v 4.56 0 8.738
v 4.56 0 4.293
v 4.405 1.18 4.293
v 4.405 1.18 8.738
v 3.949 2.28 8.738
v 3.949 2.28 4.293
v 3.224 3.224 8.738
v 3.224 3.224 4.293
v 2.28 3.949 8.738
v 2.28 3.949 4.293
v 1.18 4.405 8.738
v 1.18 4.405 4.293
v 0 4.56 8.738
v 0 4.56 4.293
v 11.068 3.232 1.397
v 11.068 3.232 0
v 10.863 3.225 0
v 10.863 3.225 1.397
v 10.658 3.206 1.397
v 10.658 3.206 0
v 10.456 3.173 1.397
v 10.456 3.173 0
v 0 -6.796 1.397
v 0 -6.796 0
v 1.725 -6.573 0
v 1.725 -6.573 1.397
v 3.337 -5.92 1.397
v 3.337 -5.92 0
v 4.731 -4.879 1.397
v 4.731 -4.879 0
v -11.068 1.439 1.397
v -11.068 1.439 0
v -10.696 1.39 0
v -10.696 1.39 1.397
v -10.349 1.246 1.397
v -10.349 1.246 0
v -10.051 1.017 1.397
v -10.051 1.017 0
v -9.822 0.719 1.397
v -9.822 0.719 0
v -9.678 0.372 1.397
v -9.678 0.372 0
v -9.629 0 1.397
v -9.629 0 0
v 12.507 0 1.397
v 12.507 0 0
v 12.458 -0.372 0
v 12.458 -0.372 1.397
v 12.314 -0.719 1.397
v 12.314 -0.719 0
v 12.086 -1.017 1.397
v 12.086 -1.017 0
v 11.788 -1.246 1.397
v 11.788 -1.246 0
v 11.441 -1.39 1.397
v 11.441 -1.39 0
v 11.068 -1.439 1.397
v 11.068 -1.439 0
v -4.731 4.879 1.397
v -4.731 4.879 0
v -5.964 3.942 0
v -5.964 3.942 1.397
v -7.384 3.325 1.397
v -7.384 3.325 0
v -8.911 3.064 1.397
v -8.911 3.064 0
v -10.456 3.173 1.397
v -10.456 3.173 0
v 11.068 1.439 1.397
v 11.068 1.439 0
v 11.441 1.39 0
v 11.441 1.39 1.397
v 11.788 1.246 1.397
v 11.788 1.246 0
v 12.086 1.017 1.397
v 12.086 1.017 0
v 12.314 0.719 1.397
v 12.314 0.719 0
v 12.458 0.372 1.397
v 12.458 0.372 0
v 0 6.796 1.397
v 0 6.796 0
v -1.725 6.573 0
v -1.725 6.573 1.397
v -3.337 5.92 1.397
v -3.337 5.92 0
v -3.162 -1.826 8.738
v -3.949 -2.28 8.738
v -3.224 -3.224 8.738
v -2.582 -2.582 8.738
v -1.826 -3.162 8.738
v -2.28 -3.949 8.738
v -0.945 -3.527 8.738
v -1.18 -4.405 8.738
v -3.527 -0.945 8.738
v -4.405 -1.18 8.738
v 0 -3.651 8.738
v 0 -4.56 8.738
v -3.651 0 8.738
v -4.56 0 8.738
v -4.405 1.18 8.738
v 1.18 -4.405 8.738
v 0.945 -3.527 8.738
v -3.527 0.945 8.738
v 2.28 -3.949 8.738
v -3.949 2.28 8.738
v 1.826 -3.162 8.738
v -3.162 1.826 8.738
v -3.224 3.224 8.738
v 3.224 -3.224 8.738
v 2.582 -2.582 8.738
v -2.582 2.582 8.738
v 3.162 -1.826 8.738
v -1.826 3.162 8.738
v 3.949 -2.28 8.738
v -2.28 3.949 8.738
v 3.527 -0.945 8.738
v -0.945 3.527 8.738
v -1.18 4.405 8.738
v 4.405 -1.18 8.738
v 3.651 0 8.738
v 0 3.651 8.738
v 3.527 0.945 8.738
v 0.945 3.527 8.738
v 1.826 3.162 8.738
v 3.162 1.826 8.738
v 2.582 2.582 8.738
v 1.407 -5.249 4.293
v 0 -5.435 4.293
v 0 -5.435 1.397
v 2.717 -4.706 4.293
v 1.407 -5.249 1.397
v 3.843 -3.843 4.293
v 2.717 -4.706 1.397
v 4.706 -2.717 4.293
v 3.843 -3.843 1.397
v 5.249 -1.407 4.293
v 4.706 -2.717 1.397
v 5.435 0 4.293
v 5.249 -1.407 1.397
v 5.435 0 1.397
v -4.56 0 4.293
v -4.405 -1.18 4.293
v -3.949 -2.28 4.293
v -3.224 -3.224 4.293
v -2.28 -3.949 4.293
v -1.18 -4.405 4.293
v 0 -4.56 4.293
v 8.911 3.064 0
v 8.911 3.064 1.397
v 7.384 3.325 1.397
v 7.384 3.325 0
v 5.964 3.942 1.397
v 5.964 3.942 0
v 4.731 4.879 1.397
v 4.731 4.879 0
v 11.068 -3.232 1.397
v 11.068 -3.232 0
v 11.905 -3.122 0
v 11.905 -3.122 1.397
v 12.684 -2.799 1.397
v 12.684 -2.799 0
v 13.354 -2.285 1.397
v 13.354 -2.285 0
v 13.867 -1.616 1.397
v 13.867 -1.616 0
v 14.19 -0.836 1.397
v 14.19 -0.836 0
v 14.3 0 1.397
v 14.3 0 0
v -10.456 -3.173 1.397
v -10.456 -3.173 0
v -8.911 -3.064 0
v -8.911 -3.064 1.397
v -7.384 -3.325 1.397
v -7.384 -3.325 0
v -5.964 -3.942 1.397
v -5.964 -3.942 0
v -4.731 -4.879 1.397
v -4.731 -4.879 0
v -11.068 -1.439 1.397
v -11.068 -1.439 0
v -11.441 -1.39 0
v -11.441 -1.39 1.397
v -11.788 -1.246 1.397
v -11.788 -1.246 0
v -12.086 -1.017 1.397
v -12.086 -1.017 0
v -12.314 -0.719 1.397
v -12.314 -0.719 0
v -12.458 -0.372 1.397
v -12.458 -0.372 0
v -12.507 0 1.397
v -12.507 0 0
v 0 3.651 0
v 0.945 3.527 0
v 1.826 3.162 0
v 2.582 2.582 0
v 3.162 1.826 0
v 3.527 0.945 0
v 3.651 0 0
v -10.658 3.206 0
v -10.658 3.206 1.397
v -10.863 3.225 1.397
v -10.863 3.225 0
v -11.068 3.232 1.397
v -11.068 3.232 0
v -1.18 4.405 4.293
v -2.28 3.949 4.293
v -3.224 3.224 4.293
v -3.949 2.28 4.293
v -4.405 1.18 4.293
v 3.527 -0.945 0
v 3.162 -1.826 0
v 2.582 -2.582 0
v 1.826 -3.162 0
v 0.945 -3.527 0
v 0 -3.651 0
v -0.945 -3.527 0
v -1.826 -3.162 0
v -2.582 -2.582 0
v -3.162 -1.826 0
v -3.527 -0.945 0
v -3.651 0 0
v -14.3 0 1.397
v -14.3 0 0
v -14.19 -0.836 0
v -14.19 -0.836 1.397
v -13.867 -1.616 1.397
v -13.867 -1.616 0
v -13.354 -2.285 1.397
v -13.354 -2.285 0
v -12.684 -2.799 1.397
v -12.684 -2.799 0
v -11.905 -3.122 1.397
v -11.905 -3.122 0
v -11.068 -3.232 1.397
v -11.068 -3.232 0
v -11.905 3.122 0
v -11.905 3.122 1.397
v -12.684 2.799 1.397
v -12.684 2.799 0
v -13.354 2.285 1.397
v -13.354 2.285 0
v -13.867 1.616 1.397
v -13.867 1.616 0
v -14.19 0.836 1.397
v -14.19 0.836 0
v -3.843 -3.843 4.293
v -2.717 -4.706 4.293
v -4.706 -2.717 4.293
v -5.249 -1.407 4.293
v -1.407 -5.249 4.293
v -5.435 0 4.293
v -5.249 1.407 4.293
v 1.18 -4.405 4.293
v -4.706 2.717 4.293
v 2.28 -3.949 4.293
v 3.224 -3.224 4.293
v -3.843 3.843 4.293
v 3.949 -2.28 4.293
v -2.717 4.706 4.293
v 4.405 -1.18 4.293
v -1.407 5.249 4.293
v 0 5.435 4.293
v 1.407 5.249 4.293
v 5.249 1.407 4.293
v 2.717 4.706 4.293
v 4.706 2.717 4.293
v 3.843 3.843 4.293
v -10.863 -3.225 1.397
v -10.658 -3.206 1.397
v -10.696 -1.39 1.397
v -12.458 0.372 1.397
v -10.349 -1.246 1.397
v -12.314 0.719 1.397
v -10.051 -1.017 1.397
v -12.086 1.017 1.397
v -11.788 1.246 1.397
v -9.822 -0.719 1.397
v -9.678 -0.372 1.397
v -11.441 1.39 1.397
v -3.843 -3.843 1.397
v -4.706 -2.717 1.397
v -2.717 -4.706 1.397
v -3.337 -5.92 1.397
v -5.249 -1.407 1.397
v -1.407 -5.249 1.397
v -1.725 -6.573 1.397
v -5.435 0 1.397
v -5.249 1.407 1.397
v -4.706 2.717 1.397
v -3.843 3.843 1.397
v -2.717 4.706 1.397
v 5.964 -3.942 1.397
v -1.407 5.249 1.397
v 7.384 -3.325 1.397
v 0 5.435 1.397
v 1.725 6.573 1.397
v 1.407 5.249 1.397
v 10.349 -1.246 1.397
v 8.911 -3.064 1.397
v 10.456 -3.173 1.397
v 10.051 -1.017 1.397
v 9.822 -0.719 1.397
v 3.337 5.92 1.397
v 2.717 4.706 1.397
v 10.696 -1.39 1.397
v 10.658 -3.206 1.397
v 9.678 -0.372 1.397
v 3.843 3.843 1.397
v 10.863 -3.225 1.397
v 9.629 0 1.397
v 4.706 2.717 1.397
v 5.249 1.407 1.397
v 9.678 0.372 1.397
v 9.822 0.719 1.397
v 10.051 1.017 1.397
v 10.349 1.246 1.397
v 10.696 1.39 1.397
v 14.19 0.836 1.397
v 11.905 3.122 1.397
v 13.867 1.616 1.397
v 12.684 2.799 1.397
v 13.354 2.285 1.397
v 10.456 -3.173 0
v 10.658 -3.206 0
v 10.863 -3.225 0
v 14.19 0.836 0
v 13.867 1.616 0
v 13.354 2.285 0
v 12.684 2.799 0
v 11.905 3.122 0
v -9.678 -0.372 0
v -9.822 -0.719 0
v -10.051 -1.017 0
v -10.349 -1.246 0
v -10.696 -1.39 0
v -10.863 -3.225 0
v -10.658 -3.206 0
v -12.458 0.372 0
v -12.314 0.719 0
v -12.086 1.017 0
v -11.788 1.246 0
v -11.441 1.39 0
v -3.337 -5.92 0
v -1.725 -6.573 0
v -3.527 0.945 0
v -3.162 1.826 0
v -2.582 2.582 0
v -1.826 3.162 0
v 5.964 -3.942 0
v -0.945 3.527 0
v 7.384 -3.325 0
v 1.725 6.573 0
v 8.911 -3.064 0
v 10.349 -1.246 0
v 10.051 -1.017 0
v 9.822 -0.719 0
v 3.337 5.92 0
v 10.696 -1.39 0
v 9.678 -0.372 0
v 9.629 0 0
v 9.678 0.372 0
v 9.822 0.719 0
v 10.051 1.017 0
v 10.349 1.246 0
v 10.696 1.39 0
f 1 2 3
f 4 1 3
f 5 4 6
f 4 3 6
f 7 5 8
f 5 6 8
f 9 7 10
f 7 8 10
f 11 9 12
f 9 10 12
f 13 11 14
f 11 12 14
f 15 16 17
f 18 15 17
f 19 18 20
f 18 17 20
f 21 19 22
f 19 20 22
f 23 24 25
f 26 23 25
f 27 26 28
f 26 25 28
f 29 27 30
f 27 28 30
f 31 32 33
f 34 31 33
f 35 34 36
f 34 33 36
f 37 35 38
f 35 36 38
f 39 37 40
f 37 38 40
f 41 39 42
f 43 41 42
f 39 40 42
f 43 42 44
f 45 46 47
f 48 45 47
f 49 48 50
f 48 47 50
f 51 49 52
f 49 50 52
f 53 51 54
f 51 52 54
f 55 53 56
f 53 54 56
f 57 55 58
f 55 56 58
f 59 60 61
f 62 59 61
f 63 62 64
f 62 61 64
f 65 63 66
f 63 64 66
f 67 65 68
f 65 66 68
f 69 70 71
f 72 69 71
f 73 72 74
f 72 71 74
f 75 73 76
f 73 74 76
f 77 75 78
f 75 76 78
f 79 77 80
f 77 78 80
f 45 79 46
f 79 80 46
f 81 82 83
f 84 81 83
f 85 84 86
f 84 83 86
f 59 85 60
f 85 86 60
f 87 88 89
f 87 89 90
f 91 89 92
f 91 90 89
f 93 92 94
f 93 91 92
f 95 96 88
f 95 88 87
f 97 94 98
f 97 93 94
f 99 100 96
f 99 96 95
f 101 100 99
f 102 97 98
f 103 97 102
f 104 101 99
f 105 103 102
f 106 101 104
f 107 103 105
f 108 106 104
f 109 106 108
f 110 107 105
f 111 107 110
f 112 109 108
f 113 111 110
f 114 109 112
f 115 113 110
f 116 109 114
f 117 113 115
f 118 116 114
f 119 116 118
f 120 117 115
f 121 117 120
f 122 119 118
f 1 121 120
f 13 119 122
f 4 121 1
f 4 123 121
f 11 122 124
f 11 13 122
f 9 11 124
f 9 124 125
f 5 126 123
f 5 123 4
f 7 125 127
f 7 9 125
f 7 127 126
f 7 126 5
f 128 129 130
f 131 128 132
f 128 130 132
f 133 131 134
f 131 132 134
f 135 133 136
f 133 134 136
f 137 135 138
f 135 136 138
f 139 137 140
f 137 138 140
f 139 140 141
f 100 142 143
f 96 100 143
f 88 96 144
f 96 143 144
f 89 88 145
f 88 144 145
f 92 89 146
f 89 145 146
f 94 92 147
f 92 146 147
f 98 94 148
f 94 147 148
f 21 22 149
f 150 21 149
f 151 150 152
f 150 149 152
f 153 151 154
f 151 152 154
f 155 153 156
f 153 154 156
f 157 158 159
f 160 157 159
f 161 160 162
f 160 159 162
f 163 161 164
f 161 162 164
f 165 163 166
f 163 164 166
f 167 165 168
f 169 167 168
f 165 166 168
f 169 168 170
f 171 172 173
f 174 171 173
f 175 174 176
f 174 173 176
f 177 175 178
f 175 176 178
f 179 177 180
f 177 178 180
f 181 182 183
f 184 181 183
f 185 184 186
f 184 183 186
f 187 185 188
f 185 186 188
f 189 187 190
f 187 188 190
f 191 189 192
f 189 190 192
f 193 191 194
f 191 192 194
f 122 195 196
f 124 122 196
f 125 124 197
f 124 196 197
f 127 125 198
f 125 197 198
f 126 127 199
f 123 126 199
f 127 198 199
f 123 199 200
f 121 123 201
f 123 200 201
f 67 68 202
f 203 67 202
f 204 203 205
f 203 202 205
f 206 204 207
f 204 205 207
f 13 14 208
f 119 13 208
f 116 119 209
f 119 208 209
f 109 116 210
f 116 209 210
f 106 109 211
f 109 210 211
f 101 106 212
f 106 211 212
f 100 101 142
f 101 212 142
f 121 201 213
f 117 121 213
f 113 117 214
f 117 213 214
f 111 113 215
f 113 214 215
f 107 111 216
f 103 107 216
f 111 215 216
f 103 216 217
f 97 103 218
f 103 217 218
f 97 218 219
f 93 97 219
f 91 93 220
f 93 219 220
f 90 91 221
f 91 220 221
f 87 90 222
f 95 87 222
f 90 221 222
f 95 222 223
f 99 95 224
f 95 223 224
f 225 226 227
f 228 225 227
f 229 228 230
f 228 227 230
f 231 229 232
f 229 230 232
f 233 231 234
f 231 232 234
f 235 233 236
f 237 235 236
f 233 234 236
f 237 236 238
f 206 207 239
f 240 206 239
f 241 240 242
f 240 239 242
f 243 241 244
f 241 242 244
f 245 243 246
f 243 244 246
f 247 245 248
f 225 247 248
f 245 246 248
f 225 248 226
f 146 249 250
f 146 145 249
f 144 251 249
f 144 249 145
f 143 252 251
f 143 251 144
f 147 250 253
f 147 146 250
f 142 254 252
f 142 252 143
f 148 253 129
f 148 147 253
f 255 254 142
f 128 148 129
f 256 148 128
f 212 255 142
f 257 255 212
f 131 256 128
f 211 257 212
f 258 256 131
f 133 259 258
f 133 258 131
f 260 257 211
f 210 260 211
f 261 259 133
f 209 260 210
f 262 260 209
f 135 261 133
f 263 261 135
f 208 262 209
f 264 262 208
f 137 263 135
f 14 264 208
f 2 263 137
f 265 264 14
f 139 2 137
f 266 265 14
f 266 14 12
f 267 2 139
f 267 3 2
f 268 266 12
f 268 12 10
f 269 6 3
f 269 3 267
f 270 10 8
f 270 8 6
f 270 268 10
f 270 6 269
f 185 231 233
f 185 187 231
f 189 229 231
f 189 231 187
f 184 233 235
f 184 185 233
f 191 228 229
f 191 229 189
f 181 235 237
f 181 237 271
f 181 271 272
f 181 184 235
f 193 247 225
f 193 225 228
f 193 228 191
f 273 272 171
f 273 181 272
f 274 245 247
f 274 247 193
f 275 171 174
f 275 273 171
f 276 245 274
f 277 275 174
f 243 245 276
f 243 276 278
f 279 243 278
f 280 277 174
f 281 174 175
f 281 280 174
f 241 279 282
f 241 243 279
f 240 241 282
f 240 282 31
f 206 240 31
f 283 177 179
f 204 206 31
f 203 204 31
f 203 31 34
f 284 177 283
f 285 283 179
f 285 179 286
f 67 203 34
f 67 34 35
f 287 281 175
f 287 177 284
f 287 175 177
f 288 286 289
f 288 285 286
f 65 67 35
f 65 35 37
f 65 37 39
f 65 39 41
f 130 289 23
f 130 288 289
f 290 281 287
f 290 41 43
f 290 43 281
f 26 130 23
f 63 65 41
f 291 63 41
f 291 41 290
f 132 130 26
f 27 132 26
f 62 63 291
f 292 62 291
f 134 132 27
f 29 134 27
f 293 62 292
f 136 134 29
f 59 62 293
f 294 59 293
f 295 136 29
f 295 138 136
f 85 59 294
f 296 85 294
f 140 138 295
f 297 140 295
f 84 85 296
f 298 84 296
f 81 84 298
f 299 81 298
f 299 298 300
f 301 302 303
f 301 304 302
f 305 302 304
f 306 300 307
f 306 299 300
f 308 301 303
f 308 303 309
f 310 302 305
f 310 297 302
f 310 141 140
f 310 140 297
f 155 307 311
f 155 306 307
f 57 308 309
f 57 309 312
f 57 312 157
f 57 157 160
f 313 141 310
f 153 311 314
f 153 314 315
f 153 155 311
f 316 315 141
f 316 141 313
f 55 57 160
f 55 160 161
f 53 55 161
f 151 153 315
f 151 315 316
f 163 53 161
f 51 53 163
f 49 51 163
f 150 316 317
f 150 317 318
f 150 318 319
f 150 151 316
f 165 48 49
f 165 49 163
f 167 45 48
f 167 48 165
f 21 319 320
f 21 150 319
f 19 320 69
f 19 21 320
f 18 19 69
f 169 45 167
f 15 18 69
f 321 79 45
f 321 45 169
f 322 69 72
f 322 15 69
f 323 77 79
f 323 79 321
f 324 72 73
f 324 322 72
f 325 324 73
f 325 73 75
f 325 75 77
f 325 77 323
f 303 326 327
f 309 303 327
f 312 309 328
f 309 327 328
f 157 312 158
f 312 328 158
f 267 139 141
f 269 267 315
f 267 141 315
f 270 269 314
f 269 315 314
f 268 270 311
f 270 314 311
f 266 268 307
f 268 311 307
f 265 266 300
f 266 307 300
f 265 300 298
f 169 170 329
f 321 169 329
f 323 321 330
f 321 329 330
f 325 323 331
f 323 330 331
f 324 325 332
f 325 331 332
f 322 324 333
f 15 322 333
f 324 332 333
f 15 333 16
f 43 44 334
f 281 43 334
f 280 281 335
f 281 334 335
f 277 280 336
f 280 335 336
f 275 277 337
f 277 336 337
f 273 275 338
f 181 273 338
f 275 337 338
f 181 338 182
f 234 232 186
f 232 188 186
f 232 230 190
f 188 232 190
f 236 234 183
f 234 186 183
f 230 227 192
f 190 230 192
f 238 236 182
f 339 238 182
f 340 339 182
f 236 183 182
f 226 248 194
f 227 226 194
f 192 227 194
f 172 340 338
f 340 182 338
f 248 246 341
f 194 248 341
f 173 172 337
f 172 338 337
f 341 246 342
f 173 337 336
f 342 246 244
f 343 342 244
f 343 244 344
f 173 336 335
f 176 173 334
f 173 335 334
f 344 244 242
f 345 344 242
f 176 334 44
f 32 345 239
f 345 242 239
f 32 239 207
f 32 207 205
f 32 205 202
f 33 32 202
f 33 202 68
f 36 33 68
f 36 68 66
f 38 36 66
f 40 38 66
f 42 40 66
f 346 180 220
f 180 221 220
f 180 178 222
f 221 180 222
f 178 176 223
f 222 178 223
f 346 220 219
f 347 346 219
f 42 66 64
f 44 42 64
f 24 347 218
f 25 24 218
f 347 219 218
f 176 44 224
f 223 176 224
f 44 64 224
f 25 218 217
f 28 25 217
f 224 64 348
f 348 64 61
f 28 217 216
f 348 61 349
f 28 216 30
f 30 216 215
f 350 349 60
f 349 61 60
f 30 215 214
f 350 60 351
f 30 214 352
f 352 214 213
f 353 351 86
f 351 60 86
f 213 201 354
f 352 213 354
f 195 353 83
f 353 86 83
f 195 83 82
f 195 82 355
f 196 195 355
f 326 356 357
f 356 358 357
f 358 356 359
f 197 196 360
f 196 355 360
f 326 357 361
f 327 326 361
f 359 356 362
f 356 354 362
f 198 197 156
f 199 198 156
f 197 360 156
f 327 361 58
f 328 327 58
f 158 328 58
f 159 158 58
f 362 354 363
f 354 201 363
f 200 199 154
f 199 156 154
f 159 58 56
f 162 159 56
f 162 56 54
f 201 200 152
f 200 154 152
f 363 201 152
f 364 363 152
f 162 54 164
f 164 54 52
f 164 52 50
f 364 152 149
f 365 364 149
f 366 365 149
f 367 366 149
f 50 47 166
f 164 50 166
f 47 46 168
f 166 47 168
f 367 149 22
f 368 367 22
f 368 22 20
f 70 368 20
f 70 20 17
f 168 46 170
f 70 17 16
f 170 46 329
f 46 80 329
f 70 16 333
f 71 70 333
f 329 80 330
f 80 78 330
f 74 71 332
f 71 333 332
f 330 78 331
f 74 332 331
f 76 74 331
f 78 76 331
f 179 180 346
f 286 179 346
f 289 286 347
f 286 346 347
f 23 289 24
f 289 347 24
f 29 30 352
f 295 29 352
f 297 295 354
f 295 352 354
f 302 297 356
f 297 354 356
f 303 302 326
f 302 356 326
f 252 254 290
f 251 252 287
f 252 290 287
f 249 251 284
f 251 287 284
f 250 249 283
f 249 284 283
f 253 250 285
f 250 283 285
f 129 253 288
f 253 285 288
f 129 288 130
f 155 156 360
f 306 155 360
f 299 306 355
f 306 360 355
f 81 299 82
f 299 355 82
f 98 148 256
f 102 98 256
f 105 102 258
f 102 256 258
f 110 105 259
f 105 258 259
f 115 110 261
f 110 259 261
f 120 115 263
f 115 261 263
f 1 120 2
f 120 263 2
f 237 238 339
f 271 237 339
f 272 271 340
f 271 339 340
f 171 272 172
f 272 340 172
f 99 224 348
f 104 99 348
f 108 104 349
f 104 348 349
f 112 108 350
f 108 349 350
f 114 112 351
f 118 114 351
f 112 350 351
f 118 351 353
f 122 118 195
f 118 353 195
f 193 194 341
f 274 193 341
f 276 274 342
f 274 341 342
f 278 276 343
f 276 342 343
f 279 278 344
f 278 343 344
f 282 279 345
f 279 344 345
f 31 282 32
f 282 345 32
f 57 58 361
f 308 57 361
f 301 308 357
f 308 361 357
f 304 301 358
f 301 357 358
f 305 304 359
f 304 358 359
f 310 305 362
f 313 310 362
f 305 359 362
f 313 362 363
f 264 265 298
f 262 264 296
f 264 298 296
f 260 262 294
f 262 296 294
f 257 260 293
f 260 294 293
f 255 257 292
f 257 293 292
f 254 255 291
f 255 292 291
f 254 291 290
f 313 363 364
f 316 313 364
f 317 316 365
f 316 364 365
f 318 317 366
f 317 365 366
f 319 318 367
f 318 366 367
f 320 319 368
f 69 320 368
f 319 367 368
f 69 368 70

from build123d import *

# Parameters (mm, degrees)
F1_DEPTH = 1.397
F2_DEPTH = 8.7376
F3_DEPTH = 4.2926


# Not quite as in the source:
# - ends of sketch curves that miss each other by under 0.0002 mm in the source are joined


with BuildPart() as f1:
    # F0 (on Top) → F1 (new body)
    with BuildSketch(Plane.XY):
        with BuildLine():
            ThreePointArc((-5.4345187307, 0), (-3.8427850469, 3.8427850469), (0, 5.4345187307))
            Line((0, 5.4345187307), (0, 6.7959154799))
            ThreePointArc((0, 6.7959154799), (-2.5520653679, 6.2985259837), (-4.7305620794, 4.8791648489))
            ThreePointArc((-4.7305620794, 4.8791648489), (-7.3841557332, 3.3252325154), (-10.4555039298, 3.1733212198))
            ThreePointArc((-10.4555039298, 3.1733212198), (-10.7604870325, 3.2172453575), (-11.0682662539, 3.2319337461))
            Line((-11.0682662539, 3.2319337461), (-11.0682662539, 1.438874613))
            ThreePointArc((-11.0682662539, 1.438874613), (-10.0508282577, 1.0174379961), (-9.6293916409, 0))
            Line((-9.6293916409, 0), (-5.4345187307, 0))
        make_face()
        with BuildLine():
            ThreePointArc((-12.5071408669, 0), (-12.08570425, 1.0174379961), (-11.0682662539, 1.438874613))
            Line((-11.0682662539, 1.438874613), (-11.0682662539, 3.2319337461))
            ThreePointArc((-11.0682662539, 3.2319337461), (-13.3535885221, 2.2853222682), (-14.3002, 0))
            Line((-14.3002, 0), (-12.5071408669, 0))
        make_face()
        with BuildLine():
            Line((-11.0682662539, -3.2319337461), (-11.0682662539, -1.438874613))
            ThreePointArc((-11.0682662539, -1.438874613), (-12.08570425, -1.0174379961), (-12.5071408669, 0))
            Line((-12.5071408669, 0), (-14.3002, 0))
            ThreePointArc((-14.3002, 0), (-13.3535885221, -2.2853222682), (-11.0682662539, -3.2319337461))
        make_face()
        with BuildLine():
            Line((0, -6.7959154799), (0, -5.4345187307))
            ThreePointArc((0, -5.4345187307), (-3.8427850469, -3.8427850469), (-5.4345187307, 0))
            Line((-5.4345187307, 0), (-9.6293916409, 0))
            ThreePointArc((-9.6293916409, 0), (-10.0508282577, -1.0174379961), (-11.0682662539, -1.438874613))
            Line((-11.0682662539, -1.438874613), (-11.0682662539, -3.2319337461))
            ThreePointArc((-11.0682662539, -3.2319337461), (-10.7604870325, -3.2172453575), (-10.4555053814, -3.1733137022))
            ThreePointArc((-10.4555053814, -3.1733137022), (-7.3841557332, -3.3252325154), (-4.7305659764, -4.8791688684))
            ThreePointArc((-4.7305659764, -4.8791688684), (-2.5520653679, -6.2985259837), (0, -6.7959154799))
        make_face()
        with BuildLine():
            ThreePointArc((0, -5.4345187307), (3.8427850469, -3.8427850469), (5.4345187307, 0))
            Line((5.4345187307, 0), (4.5601256966, 0))
            ThreePointArc((4.5601256966, 0), (3.2244958031, -3.2244958031), (0, -4.5601256966))
            Line((0, -4.5601256966), (0, -5.4345187307))
        make_face()
        with BuildLine():
            ThreePointArc((-5.4345187307, 0), (-3.8427850469, -3.8427850469), (0, -5.4345187307))
            Line((0, -5.4345187307), (0, -4.5601256966))
            ThreePointArc((0, -4.5601256966), (-3.2244958031, -3.2244958031), (-4.5601256966, 0))
            Line((-4.5601256966, 0), (-5.4345187307, 0))
        make_face()
        with BuildLine():
            Line((0, 4.5601256966), (0, 5.4345187307))
            ThreePointArc((0, 5.4345187307), (-3.8427850469, 3.8427850469), (-5.4345187307, 0))
            Line((-5.4345187307, 0), (-4.5601256966, 0))
            ThreePointArc((-4.5601256966, 0), (-3.2244958031, 3.2244958031), (0, 4.5601256966))
        make_face()
        with BuildLine():
            Line((4.5601256966, 0), (5.4345187307, 0))
            ThreePointArc((5.4345187307, 0), (3.8427850469, 3.8427850469), (0, 5.4345187307))
            Line((0, 5.4345187307), (0, 4.5601256966))
            ThreePointArc((0, 4.5601256966), (3.2244958031, 3.2244958031), (4.5601256966, 0))
        make_face()
        with BuildLine():
            ThreePointArc((0, 5.4345187307), (3.8427850469, 3.8427850469), (5.4345187307, 0))
            Line((5.4345187307, 0), (9.6293916409, 0))
            ThreePointArc((9.6293916409, 0), (10.0508282577, 1.0174379961), (11.0682662539, 1.438874613))
            Line((11.0682662539, 1.438874613), (11.0682662539, 3.2319337461))
            ThreePointArc((11.0682662539, 3.2319337461), (10.7604870325, 3.2172453575), (10.4555053814, 3.1733137022))
            ThreePointArc((10.4555053814, 3.1733137022), (7.3841557332, 3.3252325154), (4.7305659764, 4.8791688684))
            ThreePointArc((4.7305659764, 4.8791688684), (2.5520653679, 6.2985259837), (0, 6.7959154799))
            Line((0, 6.7959154799), (0, 5.4345187307))
        make_face()
        with BuildLine():
            Line((9.6293916409, 0), (5.4345187307, 0))
            ThreePointArc((5.4345187307, 0), (3.8427850469, -3.8427850469), (0, -5.4345187307))
            Line((0, -5.4345187307), (0, -6.7959154799))
            ThreePointArc((0, -6.7959154799), (2.5520653679, -6.2985259837), (4.7305620794, -4.8791648489))
            ThreePointArc((4.7305620794, -4.8791648489), (7.3841557332, -3.3252325154), (10.4555039298, -3.1733212198))
            ThreePointArc((10.4555039298, -3.1733212198), (10.7604870325, -3.2172453575), (11.0682662539, -3.2319337461))
            Line((11.0682662539, -3.2319337461), (11.0682662539, -1.438874613))
            ThreePointArc((11.0682662539, -1.438874613), (10.0508282577, -1.0174379961), (9.6293916409, 0))
        make_face()
        with BuildLine():
            ThreePointArc((12.5071408669, 0), (12.08570425, -1.0174379961), (11.0682662539, -1.438874613))
            Line((11.0682662539, -1.438874613), (11.0682662539, -3.2319337461))
            ThreePointArc((11.0682662539, -3.2319337461), (13.3535885221, -2.2853222682), (14.3002, 0))
            Line((14.3002, 0), (12.5071408669, 0))
        make_face()
        with BuildLine():
            Line((11.0682662539, 3.2319337461), (11.0682662539, 1.438874613))
            ThreePointArc((11.0682662539, 1.438874613), (12.08570425, 1.0174379961), (12.5071408669, 0))
            Line((12.5071408669, 0), (14.3002, 0))
            ThreePointArc((14.3002, 0), (13.3535885221, 2.2853222682), (11.0682662539, 3.2319337461))
        make_face()
    extrude(amount=F1_DEPTH)

    # F0 (on Top) → F2 (join)
    with BuildSketch(Plane.XY):
        with BuildLine():
            Line((0, 3.6514210372), (0, 4.5601256966))
            ThreePointArc((0, 4.5601256966), (-3.2244958031, 3.2244958031), (-4.5601256966, 0))
            Line((-4.5601256966, 0), (-3.6514210372, 0))
            ThreePointArc((-3.6514210372, 0), (-2.5819445763, 2.5819445763), (0, 3.6514210372))
        make_face()
        with BuildLine():
            Line((3.6514210372, 0), (4.5601256966, 0))
            ThreePointArc((4.5601256966, 0), (3.2244958031, 3.2244958031), (0, 4.5601256966))
            Line((0, 4.5601256966), (0, 3.6514210372))
            ThreePointArc((0, 3.6514210372), (2.5819445763, 2.5819445763), (3.6514210372, 0))
        make_face()
        with BuildLine():
            ThreePointArc((0, -4.5601256966), (3.2244958031, -3.2244958031), (4.5601256966, 0))
            Line((4.5601256966, 0), (3.6514210372, 0))
            ThreePointArc((3.6514210372, 0), (2.5819445763, -2.5819445763), (0, -3.6514210372))
            Line((0, -3.6514210372), (0, -4.5601256966))
        make_face()
        with BuildLine():
            ThreePointArc((-4.5601256966, 0), (-3.2244958031, -3.2244958031), (0, -4.5601256966))
            Line((0, -4.5601256966), (0, -3.6514210372))
            ThreePointArc((0, -3.6514210372), (-2.5819445763, -2.5819445763), (-3.6514210372, 0))
            Line((-3.6514210372, 0), (-4.5601256966, 0))
        make_face()
    extrude(amount=F2_DEPTH)

    # F0 (on Top) → F3 (join)
    with BuildSketch(Plane.XY):
        with BuildLine():
            ThreePointArc((-5.4345187307, 0), (-3.8427850469, -3.8427850469), (0, -5.4345187307))
            Line((0, -5.4345187307), (0, -4.5601256966))
            ThreePointArc((0, -4.5601256966), (-3.2244958031, -3.2244958031), (-4.5601256966, 0))
            Line((-4.5601256966, 0), (-5.4345187307, 0))
        make_face()
        with BuildLine():
            ThreePointArc((0, -5.4345187307), (3.8427850469, -3.8427850469), (5.4345187307, 0))
            Line((5.4345187307, 0), (4.5601256966, 0))
            ThreePointArc((4.5601256966, 0), (3.2244958031, -3.2244958031), (0, -4.5601256966))
            Line((0, -4.5601256966), (0, -5.4345187307))
        make_face()
        with BuildLine():
            Line((4.5601256966, 0), (5.4345187307, 0))
            ThreePointArc((5.4345187307, 0), (3.8427850469, 3.8427850469), (0, 5.4345187307))
            Line((0, 5.4345187307), (0, 4.5601256966))
            ThreePointArc((0, 4.5601256966), (3.2244958031, 3.2244958031), (4.5601256966, 0))
        make_face()
        with BuildLine():
            Line((0, 4.5601256966), (0, 5.4345187307))
            ThreePointArc((0, 5.4345187307), (-3.8427850469, 3.8427850469), (-5.4345187307, 0))
            Line((-5.4345187307, 0), (-4.5601256966, 0))
            ThreePointArc((-4.5601256966, 0), (-3.2244958031, 3.2244958031), (0, 4.5601256966))
        make_face()
    extrude(amount=F3_DEPTH)


solid = f1.part
